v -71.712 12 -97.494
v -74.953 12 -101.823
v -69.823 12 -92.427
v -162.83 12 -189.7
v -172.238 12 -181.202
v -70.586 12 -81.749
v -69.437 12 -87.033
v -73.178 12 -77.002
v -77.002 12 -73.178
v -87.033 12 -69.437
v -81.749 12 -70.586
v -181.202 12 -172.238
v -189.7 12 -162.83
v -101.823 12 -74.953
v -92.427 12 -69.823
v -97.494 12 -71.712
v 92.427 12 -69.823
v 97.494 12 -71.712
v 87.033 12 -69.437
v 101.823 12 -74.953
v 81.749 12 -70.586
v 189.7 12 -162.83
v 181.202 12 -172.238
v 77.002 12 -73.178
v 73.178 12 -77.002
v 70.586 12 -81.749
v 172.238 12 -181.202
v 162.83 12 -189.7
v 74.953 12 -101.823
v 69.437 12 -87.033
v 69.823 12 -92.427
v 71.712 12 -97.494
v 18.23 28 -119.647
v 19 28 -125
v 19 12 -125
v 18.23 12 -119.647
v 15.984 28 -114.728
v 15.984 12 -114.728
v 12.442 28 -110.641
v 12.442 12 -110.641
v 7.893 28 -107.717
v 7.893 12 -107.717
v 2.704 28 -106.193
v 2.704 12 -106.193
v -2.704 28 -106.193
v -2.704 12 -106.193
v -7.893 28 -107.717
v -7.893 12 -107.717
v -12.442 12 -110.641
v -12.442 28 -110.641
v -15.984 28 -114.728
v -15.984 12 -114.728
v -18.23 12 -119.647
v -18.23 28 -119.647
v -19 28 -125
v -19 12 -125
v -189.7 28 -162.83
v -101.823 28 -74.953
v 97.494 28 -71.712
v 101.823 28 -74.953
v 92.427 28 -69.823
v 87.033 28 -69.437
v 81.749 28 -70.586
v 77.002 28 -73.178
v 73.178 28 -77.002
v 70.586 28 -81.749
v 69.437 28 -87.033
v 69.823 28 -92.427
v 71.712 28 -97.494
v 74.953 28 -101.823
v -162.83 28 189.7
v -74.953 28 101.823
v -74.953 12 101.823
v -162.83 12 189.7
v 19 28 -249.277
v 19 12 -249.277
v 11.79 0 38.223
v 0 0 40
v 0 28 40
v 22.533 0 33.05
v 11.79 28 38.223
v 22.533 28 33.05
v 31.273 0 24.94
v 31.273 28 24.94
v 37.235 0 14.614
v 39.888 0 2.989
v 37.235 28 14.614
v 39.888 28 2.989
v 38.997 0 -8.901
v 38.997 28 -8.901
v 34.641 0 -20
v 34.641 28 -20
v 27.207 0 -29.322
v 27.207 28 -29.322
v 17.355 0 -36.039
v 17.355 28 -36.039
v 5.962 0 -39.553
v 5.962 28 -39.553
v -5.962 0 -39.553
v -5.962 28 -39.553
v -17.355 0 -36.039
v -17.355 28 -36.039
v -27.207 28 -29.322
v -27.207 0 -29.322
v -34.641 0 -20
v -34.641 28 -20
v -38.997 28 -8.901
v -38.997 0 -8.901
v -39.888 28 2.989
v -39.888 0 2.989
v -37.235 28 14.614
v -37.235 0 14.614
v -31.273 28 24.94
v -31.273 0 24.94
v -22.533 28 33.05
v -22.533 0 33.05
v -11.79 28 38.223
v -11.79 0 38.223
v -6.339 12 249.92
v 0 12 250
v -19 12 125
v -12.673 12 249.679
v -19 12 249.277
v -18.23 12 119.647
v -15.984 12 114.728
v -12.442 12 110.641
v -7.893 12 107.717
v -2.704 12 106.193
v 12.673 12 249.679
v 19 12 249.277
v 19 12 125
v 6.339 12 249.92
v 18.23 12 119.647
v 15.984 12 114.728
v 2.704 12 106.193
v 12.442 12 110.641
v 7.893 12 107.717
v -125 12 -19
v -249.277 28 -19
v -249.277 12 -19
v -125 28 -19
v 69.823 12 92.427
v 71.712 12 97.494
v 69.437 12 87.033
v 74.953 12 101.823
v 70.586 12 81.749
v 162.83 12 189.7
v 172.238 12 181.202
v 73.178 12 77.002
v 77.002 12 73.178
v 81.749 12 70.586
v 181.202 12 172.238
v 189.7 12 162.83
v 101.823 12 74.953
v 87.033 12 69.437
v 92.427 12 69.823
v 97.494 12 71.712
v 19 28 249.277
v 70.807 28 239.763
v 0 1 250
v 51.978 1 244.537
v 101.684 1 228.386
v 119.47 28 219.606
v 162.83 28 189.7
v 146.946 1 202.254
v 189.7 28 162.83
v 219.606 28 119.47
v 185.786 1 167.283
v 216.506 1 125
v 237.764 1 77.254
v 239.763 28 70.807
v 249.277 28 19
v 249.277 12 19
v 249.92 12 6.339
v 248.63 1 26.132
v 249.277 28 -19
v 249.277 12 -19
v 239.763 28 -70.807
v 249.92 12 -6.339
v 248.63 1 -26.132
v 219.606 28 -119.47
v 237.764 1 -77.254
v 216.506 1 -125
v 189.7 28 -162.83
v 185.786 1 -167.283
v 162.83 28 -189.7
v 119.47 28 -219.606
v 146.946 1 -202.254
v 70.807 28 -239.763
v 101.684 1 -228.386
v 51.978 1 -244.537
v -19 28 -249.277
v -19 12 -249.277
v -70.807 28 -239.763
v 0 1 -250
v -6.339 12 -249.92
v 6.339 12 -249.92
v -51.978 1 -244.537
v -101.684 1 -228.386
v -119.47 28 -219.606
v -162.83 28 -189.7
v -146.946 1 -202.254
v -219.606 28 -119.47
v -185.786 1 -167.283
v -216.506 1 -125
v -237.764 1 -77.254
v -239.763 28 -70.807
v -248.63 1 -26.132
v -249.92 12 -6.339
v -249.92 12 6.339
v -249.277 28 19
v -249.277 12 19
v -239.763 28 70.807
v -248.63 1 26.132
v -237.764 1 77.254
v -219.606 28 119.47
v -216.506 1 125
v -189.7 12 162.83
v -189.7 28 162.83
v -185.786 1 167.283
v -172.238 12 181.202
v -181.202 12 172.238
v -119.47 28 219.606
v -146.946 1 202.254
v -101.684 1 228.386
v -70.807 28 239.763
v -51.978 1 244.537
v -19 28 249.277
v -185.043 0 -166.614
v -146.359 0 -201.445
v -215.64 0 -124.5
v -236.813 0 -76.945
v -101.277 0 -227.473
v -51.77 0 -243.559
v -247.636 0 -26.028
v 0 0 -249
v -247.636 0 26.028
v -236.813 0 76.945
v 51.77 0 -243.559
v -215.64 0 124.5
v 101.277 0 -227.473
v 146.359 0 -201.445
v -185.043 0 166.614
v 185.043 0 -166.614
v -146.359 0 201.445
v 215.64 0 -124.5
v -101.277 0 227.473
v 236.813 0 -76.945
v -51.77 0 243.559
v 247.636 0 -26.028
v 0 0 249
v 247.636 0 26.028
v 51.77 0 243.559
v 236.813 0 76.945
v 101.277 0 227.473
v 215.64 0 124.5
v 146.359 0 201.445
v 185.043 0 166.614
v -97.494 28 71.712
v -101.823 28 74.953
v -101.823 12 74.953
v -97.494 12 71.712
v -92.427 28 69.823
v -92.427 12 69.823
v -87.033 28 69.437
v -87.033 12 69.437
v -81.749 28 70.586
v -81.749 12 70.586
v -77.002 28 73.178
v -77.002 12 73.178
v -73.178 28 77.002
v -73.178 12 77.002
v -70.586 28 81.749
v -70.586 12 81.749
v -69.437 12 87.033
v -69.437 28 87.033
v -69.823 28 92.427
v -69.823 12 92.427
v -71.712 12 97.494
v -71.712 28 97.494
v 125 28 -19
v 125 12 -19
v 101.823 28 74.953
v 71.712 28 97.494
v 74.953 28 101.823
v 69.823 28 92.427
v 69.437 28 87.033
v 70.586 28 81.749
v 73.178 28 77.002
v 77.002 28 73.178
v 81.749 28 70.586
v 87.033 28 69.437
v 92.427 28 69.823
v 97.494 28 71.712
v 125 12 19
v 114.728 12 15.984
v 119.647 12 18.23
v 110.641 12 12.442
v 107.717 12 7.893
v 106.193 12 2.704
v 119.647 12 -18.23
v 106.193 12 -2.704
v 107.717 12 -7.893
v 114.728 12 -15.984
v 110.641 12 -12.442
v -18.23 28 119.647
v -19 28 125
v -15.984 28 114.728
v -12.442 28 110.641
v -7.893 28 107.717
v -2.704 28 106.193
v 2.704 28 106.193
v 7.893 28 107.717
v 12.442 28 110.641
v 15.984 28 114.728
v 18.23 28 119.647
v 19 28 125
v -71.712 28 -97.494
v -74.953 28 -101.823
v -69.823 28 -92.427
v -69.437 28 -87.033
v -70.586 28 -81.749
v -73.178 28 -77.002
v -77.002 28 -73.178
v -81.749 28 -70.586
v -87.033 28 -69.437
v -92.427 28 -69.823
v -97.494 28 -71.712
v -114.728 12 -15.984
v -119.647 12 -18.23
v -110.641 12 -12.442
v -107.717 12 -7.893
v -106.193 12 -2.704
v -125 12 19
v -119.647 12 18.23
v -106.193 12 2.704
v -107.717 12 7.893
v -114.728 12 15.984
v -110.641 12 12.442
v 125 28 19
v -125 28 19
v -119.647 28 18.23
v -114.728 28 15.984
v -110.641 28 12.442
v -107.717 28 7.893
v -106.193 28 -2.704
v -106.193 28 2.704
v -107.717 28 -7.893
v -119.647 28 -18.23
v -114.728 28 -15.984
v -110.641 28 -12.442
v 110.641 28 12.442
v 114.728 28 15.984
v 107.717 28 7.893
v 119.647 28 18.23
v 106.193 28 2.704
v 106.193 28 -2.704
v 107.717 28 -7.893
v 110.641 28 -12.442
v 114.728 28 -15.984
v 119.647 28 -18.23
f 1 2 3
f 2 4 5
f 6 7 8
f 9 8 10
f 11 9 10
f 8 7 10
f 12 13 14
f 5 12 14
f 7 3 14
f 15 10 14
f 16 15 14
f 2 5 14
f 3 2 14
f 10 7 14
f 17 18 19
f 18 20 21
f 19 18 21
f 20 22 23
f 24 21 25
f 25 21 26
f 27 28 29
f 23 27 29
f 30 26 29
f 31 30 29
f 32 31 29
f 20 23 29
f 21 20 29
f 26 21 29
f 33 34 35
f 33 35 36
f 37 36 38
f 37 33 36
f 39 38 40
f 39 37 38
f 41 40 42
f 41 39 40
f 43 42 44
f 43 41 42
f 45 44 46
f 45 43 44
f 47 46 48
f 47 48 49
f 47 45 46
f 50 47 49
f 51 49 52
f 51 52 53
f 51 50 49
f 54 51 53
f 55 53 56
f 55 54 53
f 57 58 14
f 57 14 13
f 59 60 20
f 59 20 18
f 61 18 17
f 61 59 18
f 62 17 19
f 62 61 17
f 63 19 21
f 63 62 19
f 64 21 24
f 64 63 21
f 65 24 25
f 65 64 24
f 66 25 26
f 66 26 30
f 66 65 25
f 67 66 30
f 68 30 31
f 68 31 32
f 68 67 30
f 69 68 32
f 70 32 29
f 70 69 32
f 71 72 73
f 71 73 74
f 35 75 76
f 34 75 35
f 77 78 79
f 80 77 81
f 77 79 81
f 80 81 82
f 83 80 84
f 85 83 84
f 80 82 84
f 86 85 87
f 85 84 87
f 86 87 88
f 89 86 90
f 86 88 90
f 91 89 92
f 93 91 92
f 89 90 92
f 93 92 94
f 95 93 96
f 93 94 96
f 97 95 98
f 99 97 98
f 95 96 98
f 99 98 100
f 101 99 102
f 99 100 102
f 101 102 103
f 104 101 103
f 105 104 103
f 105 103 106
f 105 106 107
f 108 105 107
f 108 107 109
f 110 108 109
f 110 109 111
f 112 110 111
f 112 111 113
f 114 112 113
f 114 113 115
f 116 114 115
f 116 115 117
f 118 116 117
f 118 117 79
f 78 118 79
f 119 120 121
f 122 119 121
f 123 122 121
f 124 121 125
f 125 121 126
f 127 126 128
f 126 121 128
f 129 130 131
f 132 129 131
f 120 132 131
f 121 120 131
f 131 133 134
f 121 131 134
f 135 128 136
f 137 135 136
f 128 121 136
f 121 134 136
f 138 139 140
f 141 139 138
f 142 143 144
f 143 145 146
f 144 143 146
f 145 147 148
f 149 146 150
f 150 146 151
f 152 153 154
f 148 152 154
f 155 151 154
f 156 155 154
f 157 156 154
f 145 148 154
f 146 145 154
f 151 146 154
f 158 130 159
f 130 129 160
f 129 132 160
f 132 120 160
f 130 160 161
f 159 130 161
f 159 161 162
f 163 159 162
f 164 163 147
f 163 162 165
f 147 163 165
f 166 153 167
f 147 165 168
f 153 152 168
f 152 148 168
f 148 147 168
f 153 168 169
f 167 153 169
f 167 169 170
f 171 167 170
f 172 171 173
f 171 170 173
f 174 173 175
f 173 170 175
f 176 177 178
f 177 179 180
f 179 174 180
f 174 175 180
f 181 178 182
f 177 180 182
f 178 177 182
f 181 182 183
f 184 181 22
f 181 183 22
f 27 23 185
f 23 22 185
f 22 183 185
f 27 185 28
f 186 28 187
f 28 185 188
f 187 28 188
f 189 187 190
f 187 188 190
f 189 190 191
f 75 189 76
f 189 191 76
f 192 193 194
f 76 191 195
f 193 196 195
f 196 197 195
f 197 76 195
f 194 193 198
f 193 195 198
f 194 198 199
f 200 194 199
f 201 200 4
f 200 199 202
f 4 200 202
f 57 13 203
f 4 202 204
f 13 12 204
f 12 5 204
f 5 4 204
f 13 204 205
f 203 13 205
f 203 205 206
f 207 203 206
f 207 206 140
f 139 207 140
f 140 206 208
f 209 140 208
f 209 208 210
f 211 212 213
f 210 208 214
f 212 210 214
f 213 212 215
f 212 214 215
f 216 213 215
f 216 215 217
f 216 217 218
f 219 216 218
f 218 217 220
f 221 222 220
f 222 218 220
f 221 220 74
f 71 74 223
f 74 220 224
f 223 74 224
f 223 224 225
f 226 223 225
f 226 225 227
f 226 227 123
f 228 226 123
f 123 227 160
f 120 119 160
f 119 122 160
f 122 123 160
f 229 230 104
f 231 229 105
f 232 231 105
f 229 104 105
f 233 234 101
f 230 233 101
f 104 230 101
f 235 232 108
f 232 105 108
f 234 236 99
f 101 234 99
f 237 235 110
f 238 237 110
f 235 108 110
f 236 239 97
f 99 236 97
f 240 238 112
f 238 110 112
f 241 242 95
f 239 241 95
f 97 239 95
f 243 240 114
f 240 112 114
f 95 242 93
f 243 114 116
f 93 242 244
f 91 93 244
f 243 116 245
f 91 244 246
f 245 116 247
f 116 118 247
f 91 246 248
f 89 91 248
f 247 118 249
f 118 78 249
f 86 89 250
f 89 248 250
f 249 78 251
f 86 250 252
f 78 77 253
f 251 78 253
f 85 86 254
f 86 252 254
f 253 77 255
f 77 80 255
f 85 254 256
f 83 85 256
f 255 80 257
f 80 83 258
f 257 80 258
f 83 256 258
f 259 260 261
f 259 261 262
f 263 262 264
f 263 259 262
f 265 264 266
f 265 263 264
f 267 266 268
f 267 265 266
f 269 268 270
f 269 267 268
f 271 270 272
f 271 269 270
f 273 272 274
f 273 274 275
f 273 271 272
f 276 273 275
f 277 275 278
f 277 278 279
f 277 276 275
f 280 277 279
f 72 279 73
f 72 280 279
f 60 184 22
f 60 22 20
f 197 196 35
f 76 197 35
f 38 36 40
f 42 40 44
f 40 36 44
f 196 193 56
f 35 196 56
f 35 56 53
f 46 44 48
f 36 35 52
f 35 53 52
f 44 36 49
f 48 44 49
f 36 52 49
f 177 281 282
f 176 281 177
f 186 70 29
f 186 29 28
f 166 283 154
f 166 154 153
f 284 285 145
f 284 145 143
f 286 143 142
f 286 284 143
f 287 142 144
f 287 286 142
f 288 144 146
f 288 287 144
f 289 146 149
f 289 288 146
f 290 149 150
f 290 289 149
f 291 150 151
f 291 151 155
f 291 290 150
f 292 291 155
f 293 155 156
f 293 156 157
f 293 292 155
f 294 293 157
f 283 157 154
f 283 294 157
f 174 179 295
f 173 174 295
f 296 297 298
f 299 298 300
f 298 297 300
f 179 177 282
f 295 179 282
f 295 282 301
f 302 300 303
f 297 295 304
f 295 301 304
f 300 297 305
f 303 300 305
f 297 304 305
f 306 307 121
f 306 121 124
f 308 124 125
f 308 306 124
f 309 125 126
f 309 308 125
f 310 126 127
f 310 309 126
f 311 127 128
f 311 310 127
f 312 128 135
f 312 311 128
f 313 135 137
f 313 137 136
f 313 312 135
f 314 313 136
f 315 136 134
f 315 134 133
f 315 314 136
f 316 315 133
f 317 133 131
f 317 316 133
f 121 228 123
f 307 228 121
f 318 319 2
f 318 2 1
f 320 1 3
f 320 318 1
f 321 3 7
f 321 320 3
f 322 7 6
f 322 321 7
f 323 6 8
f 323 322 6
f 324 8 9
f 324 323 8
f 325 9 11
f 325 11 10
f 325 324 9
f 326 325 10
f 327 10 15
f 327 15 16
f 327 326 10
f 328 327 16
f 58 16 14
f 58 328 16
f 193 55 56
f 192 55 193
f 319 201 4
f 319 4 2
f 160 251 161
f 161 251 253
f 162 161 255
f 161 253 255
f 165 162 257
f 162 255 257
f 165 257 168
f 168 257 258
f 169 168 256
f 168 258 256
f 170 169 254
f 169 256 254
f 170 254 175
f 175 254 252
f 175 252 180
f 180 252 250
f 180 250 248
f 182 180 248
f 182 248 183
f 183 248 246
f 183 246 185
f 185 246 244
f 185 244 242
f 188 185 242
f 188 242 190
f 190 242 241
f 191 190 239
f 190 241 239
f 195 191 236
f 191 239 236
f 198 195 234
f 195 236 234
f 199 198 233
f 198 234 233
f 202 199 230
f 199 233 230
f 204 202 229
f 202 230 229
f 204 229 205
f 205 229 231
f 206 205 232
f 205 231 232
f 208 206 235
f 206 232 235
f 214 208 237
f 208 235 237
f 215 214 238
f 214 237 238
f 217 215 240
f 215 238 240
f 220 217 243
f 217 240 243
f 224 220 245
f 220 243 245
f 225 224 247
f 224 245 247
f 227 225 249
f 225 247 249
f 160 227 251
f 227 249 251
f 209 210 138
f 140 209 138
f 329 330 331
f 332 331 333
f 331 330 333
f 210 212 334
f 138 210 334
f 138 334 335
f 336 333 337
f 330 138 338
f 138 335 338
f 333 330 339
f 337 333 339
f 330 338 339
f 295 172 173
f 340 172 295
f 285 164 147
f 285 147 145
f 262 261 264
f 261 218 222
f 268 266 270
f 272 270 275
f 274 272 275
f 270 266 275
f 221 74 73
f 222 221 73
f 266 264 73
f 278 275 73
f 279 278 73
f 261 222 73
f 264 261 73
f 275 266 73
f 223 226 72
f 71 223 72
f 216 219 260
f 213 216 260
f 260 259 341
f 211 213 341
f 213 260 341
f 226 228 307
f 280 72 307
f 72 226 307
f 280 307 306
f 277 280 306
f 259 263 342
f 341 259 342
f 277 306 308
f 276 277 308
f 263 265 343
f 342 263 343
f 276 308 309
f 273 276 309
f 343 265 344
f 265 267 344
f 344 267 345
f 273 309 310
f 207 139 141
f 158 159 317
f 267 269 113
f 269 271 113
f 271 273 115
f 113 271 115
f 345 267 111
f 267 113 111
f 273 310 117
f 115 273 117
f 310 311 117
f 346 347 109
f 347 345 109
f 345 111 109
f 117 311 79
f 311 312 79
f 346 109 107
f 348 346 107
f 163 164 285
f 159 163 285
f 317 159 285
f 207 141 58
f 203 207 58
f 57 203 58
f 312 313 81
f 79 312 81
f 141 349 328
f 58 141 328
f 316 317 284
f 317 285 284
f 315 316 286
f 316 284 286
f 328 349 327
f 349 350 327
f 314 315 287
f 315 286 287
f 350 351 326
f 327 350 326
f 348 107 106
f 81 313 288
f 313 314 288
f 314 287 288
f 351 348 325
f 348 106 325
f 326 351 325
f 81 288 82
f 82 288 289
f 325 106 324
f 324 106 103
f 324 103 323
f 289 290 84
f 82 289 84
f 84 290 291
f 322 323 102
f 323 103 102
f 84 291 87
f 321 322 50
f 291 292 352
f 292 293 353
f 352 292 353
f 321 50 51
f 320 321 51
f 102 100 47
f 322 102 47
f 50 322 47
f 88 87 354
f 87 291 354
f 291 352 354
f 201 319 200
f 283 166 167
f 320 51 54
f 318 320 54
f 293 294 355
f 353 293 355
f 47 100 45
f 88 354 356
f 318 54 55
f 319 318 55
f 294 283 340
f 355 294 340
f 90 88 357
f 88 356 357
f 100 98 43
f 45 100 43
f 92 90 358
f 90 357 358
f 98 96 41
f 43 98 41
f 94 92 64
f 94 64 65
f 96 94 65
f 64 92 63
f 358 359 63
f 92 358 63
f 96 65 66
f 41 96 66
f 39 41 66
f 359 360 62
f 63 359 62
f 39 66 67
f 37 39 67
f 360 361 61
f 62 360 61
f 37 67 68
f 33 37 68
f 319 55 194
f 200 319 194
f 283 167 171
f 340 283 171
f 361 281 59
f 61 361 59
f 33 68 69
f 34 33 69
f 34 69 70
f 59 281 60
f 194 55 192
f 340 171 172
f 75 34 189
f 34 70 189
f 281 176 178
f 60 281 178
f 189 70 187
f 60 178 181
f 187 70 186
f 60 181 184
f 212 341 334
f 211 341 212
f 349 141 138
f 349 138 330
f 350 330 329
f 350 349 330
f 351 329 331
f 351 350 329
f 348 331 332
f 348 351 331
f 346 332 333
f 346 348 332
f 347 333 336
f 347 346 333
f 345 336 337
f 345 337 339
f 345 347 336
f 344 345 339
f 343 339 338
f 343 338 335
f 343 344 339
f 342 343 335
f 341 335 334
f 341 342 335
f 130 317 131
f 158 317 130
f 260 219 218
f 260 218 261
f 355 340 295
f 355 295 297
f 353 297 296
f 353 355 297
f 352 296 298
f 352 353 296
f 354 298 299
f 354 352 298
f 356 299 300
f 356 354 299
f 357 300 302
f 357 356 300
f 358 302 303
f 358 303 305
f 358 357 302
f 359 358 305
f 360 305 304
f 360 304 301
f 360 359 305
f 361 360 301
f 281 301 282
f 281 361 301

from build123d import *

# Parameters (mm, degrees)
SKETCH_1_R               = 250
EXTRUDE_1_DEPTH          = 50
CHAMFER_1_SIZE           = 1
CUT_EXTRUDE_1_DEPTH      = 22
CUT_EXTRUDE_2_DEPTH      = 16
CUT_EXTRUDE_3_DEPTH      = 22
CUT_EXTRUDE_4_DEPTH      = 16
PATTERN_CIRCULAR_1_COUNT = 4
SKETCH_6_R               = 60
CUT_EXTRUDE_5_DEPTH      = 20
SKETCH_22_R              = 40
CUT_EXTRUDE_13_DEPTH     = 355.823899984


with BuildPart() as part:
    # 草图1 → 凸台-拉伸1 (new body)
    with BuildSketch(Plane(origin=(0, 0, 0), x_dir=(1, 0, 0), z_dir=(0, 1, 0))):
        Circle(SKETCH_1_R)
    extrude(amount=EXTRUDE_1_DEPTH)

    # 倒角1
    chamfer_1_edges = [part.edges().sort_by_distance(p)[0] for p in [
        (-250, 0, 0),
        (-250, 50, 0),
    ]]
    chamfer(chamfer_1_edges, length=CHAMFER_1_SIZE)

    # 草图2 → 切除-拉伸1 (cut)
    with BuildSketch(Plane(origin=(0, 50, 0), x_dir=(1, 0, 0), z_dir=(0, 1, 0))):
        with BuildLine():
            Line((125, 11), (250, 11))
            Line((250, 11), (250, -11))
            Line((250, -11), (125, -11))
            ThreePointArc((125, -11), (114, 0), (125, 11))
        make_face()
    cut_extrude_1 = extrude(amount=-CUT_EXTRUDE_1_DEPTH, mode=Mode.SUBTRACT)

    # 草图3 → 切除-拉伸2 (cut)
    with BuildSketch(Plane(origin=(0, 28, 0), x_dir=(1, 0, 0), z_dir=(0, 1, 0))):
        with BuildLine():
            Line((250, 19), (250, -19))
            Line((250, -19), (125, -19))
            ThreePointArc((125, -19), (106, 0), (125, 19))
            Line((125, 19), (250, 19))
        make_face()
    cut_extrude_2 = extrude(amount=-CUT_EXTRUDE_2_DEPTH, mode=Mode.SUBTRACT)

    # 草图4 → 切除-拉伸3 (cut)
    with BuildSketch(Plane(origin=(0, 50, 0), x_dir=(1, 0, 0), z_dir=(0, 1, 0))):
        with BuildLine():
            Line((168.998520704, 184.55486989), (184.55486989, 168.998520704))
            Line((184.55486989, 168.998520704), (96.166522241, 80.610173055))
            ThreePointArc((96.166522241, 80.610173055), (80.610173055, 80.610173055), (80.610173055, 96.166522241))
            Line((80.610173055, 96.166522241), (168.998520704, 184.55486989))
        make_face()
    cut_extrude_3 = extrude(amount=-CUT_EXTRUDE_3_DEPTH, mode=Mode.SUBTRACT)

    # 草图5 → 切除-拉伸4 (cut)
    with BuildSketch(Plane(origin=(0, 28, 0), x_dir=(1, 0, 0), z_dir=(0, 1, 0))):
        with BuildLine():
            Line((163.341666454, 190.211724139), (190.211724139, 163.341666454))
            Line((190.211724139, 163.341666454), (101.823376491, 74.953318806))
            ThreePointArc((101.823376491, 74.953318806), (74.953318806, 74.953318806), (74.953318806, 101.823376491))
            Line((74.953318806, 101.823376491), (163.341666454, 190.211724139))
        make_face()
    cut_extrude_4 = extrude(amount=-CUT_EXTRUDE_4_DEPTH, mode=Mode.SUBTRACT)

    # 阵列(圆周)1: 切除-拉伸1, 切除-拉伸2, 切除-拉伸3, 切除-拉伸4 ×4 about axis
    pattern_circular_1_axis = Axis((0, 50, 0), (0, -1, 0))
    add([cut_extrude_1.rotate(pattern_circular_1_axis, i * 360 / PATTERN_CIRCULAR_1_COUNT) for i in range(1, PATTERN_CIRCULAR_1_COUNT)], mode=Mode.SUBTRACT)
    add([cut_extrude_2.rotate(pattern_circular_1_axis, i * 360 / PATTERN_CIRCULAR_1_COUNT) for i in range(1, PATTERN_CIRCULAR_1_COUNT)], mode=Mode.SUBTRACT)
    add([cut_extrude_3.rotate(pattern_circular_1_axis, i * 360 / PATTERN_CIRCULAR_1_COUNT) for i in range(1, PATTERN_CIRCULAR_1_COUNT)], mode=Mode.SUBTRACT)
    add([cut_extrude_4.rotate(pattern_circular_1_axis, i * 360 / PATTERN_CIRCULAR_1_COUNT) for i in range(1, PATTERN_CIRCULAR_1_COUNT)], mode=Mode.SUBTRACT)

    # 草图6 → 切除-拉伸5 (cut)
    with BuildSketch(Plane(origin=(0, 50, 0), x_dir=(1, 0, 0), z_dir=(0, 1, 0))):
        Circle(SKETCH_6_R)
    extrude(amount=-CUT_EXTRUDE_5_DEPTH, mode=Mode.SUBTRACT)

    # 草图22 → 切除-拉伸13 (cut, through all)
    with BuildSketch(Plane(origin=(0, 30, 0), x_dir=(1, 0, 0), z_dir=(0, 1, 0))):
        Circle(SKETCH_22_R)
    extrude(amount=-CUT_EXTRUDE_13_DEPTH, mode=Mode.SUBTRACT)


with BuildPart() as body_2:
    # Split Bodies 2: the piece on the far side of the plane
    add(part.part)
    split(bisect_by=Plane(origin=(0, 28, 0), x_dir=(0, 0, -1), z_dir=(0, -1, 0)), keep=Keep.BOTTOM)


with BuildPart() as part_1:
    add(part.part)

    # Split Bodies 2
    split(bisect_by=Plane(origin=(0, 28, 0), x_dir=(0, 0, -1), z_dir=(0, -1, 0)), keep=Keep.TOP)


solid = part_1.part
